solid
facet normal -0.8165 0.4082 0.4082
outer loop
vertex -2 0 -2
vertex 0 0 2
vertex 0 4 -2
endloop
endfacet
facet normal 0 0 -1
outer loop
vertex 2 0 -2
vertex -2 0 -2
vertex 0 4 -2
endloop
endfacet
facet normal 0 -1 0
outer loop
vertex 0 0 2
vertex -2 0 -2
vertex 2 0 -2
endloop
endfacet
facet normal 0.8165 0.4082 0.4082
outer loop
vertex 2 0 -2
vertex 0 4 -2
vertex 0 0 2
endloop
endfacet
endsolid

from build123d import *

# Parameters (mm, degrees)
SKETCH1_W           = 4
SKETCH1_H           = 4
BOSS_EXTRUDE1_DEPTH = 4
CUT_EXTRUDE1_DEPTH  = 10
CUT_EXTRUDE2_DEPTH  = 10


with BuildPart() as part:
    # Sketch1 → Boss-Extrude1 (new body)
    with BuildSketch(Plane(origin=(0, 0, 0), x_dir=(1, 0, 0), z_dir=(0, 1, 0))):
        Rectangle(SKETCH1_W, SKETCH1_H)
    extrude(amount=BOSS_EXTRUDE1_DEPTH)

    # 3DSketch1 → Cut-Extrude1 (cut, along a direction that is not the sketch's normal)
    with BuildSketch(Plane(origin=(0, 4, -2), x_dir=(0, -0.7071067811865476, 0.7071067811865476), z_dir=(0.816496580927726, -0.408248290463863, -0.408248290463863))):
        Polygon((0, 0), (2.828427125, 3.464101615), (5.656854249, 0), align=None)
    extrude(amount=-CUT_EXTRUDE1_DEPTH, dir=(0, -1, 0), mode=Mode.SUBTRACT)


with BuildPart() as body_2:
    # of the pieces the cut leaves, the one that is kept (cut_extrude1_keep)
    add(part.part.solids().sort_by_distance((2, 0, 2))[0])

    # 3DSketch2 → Cut-Extrude2 (cut, along a direction that is not the sketch's normal)
    with BuildSketch(Plane(origin=(0, 4, -2), x_dir=(0, -0.7071067811865475, 0.7071067811865476), z_dir=(0.816496580927726, 0.40824829046386313, 0.408248290463863))):
        Polygon((0, 0), (5.656854249, 0), (2.828427125, 3.464101615), align=None)
    extrude(amount=CUT_EXTRUDE2_DEPTH, dir=(0, 1, 0), mode=Mode.SUBTRACT)


with BuildPart() as body_2_2:
    # of the pieces the cut leaves, the one that is kept (cut_extrude2_keep)
    add(body_2.part.solids().sort_by_distance((-2, 0, -2))[0])


solid = body_2_2.part
